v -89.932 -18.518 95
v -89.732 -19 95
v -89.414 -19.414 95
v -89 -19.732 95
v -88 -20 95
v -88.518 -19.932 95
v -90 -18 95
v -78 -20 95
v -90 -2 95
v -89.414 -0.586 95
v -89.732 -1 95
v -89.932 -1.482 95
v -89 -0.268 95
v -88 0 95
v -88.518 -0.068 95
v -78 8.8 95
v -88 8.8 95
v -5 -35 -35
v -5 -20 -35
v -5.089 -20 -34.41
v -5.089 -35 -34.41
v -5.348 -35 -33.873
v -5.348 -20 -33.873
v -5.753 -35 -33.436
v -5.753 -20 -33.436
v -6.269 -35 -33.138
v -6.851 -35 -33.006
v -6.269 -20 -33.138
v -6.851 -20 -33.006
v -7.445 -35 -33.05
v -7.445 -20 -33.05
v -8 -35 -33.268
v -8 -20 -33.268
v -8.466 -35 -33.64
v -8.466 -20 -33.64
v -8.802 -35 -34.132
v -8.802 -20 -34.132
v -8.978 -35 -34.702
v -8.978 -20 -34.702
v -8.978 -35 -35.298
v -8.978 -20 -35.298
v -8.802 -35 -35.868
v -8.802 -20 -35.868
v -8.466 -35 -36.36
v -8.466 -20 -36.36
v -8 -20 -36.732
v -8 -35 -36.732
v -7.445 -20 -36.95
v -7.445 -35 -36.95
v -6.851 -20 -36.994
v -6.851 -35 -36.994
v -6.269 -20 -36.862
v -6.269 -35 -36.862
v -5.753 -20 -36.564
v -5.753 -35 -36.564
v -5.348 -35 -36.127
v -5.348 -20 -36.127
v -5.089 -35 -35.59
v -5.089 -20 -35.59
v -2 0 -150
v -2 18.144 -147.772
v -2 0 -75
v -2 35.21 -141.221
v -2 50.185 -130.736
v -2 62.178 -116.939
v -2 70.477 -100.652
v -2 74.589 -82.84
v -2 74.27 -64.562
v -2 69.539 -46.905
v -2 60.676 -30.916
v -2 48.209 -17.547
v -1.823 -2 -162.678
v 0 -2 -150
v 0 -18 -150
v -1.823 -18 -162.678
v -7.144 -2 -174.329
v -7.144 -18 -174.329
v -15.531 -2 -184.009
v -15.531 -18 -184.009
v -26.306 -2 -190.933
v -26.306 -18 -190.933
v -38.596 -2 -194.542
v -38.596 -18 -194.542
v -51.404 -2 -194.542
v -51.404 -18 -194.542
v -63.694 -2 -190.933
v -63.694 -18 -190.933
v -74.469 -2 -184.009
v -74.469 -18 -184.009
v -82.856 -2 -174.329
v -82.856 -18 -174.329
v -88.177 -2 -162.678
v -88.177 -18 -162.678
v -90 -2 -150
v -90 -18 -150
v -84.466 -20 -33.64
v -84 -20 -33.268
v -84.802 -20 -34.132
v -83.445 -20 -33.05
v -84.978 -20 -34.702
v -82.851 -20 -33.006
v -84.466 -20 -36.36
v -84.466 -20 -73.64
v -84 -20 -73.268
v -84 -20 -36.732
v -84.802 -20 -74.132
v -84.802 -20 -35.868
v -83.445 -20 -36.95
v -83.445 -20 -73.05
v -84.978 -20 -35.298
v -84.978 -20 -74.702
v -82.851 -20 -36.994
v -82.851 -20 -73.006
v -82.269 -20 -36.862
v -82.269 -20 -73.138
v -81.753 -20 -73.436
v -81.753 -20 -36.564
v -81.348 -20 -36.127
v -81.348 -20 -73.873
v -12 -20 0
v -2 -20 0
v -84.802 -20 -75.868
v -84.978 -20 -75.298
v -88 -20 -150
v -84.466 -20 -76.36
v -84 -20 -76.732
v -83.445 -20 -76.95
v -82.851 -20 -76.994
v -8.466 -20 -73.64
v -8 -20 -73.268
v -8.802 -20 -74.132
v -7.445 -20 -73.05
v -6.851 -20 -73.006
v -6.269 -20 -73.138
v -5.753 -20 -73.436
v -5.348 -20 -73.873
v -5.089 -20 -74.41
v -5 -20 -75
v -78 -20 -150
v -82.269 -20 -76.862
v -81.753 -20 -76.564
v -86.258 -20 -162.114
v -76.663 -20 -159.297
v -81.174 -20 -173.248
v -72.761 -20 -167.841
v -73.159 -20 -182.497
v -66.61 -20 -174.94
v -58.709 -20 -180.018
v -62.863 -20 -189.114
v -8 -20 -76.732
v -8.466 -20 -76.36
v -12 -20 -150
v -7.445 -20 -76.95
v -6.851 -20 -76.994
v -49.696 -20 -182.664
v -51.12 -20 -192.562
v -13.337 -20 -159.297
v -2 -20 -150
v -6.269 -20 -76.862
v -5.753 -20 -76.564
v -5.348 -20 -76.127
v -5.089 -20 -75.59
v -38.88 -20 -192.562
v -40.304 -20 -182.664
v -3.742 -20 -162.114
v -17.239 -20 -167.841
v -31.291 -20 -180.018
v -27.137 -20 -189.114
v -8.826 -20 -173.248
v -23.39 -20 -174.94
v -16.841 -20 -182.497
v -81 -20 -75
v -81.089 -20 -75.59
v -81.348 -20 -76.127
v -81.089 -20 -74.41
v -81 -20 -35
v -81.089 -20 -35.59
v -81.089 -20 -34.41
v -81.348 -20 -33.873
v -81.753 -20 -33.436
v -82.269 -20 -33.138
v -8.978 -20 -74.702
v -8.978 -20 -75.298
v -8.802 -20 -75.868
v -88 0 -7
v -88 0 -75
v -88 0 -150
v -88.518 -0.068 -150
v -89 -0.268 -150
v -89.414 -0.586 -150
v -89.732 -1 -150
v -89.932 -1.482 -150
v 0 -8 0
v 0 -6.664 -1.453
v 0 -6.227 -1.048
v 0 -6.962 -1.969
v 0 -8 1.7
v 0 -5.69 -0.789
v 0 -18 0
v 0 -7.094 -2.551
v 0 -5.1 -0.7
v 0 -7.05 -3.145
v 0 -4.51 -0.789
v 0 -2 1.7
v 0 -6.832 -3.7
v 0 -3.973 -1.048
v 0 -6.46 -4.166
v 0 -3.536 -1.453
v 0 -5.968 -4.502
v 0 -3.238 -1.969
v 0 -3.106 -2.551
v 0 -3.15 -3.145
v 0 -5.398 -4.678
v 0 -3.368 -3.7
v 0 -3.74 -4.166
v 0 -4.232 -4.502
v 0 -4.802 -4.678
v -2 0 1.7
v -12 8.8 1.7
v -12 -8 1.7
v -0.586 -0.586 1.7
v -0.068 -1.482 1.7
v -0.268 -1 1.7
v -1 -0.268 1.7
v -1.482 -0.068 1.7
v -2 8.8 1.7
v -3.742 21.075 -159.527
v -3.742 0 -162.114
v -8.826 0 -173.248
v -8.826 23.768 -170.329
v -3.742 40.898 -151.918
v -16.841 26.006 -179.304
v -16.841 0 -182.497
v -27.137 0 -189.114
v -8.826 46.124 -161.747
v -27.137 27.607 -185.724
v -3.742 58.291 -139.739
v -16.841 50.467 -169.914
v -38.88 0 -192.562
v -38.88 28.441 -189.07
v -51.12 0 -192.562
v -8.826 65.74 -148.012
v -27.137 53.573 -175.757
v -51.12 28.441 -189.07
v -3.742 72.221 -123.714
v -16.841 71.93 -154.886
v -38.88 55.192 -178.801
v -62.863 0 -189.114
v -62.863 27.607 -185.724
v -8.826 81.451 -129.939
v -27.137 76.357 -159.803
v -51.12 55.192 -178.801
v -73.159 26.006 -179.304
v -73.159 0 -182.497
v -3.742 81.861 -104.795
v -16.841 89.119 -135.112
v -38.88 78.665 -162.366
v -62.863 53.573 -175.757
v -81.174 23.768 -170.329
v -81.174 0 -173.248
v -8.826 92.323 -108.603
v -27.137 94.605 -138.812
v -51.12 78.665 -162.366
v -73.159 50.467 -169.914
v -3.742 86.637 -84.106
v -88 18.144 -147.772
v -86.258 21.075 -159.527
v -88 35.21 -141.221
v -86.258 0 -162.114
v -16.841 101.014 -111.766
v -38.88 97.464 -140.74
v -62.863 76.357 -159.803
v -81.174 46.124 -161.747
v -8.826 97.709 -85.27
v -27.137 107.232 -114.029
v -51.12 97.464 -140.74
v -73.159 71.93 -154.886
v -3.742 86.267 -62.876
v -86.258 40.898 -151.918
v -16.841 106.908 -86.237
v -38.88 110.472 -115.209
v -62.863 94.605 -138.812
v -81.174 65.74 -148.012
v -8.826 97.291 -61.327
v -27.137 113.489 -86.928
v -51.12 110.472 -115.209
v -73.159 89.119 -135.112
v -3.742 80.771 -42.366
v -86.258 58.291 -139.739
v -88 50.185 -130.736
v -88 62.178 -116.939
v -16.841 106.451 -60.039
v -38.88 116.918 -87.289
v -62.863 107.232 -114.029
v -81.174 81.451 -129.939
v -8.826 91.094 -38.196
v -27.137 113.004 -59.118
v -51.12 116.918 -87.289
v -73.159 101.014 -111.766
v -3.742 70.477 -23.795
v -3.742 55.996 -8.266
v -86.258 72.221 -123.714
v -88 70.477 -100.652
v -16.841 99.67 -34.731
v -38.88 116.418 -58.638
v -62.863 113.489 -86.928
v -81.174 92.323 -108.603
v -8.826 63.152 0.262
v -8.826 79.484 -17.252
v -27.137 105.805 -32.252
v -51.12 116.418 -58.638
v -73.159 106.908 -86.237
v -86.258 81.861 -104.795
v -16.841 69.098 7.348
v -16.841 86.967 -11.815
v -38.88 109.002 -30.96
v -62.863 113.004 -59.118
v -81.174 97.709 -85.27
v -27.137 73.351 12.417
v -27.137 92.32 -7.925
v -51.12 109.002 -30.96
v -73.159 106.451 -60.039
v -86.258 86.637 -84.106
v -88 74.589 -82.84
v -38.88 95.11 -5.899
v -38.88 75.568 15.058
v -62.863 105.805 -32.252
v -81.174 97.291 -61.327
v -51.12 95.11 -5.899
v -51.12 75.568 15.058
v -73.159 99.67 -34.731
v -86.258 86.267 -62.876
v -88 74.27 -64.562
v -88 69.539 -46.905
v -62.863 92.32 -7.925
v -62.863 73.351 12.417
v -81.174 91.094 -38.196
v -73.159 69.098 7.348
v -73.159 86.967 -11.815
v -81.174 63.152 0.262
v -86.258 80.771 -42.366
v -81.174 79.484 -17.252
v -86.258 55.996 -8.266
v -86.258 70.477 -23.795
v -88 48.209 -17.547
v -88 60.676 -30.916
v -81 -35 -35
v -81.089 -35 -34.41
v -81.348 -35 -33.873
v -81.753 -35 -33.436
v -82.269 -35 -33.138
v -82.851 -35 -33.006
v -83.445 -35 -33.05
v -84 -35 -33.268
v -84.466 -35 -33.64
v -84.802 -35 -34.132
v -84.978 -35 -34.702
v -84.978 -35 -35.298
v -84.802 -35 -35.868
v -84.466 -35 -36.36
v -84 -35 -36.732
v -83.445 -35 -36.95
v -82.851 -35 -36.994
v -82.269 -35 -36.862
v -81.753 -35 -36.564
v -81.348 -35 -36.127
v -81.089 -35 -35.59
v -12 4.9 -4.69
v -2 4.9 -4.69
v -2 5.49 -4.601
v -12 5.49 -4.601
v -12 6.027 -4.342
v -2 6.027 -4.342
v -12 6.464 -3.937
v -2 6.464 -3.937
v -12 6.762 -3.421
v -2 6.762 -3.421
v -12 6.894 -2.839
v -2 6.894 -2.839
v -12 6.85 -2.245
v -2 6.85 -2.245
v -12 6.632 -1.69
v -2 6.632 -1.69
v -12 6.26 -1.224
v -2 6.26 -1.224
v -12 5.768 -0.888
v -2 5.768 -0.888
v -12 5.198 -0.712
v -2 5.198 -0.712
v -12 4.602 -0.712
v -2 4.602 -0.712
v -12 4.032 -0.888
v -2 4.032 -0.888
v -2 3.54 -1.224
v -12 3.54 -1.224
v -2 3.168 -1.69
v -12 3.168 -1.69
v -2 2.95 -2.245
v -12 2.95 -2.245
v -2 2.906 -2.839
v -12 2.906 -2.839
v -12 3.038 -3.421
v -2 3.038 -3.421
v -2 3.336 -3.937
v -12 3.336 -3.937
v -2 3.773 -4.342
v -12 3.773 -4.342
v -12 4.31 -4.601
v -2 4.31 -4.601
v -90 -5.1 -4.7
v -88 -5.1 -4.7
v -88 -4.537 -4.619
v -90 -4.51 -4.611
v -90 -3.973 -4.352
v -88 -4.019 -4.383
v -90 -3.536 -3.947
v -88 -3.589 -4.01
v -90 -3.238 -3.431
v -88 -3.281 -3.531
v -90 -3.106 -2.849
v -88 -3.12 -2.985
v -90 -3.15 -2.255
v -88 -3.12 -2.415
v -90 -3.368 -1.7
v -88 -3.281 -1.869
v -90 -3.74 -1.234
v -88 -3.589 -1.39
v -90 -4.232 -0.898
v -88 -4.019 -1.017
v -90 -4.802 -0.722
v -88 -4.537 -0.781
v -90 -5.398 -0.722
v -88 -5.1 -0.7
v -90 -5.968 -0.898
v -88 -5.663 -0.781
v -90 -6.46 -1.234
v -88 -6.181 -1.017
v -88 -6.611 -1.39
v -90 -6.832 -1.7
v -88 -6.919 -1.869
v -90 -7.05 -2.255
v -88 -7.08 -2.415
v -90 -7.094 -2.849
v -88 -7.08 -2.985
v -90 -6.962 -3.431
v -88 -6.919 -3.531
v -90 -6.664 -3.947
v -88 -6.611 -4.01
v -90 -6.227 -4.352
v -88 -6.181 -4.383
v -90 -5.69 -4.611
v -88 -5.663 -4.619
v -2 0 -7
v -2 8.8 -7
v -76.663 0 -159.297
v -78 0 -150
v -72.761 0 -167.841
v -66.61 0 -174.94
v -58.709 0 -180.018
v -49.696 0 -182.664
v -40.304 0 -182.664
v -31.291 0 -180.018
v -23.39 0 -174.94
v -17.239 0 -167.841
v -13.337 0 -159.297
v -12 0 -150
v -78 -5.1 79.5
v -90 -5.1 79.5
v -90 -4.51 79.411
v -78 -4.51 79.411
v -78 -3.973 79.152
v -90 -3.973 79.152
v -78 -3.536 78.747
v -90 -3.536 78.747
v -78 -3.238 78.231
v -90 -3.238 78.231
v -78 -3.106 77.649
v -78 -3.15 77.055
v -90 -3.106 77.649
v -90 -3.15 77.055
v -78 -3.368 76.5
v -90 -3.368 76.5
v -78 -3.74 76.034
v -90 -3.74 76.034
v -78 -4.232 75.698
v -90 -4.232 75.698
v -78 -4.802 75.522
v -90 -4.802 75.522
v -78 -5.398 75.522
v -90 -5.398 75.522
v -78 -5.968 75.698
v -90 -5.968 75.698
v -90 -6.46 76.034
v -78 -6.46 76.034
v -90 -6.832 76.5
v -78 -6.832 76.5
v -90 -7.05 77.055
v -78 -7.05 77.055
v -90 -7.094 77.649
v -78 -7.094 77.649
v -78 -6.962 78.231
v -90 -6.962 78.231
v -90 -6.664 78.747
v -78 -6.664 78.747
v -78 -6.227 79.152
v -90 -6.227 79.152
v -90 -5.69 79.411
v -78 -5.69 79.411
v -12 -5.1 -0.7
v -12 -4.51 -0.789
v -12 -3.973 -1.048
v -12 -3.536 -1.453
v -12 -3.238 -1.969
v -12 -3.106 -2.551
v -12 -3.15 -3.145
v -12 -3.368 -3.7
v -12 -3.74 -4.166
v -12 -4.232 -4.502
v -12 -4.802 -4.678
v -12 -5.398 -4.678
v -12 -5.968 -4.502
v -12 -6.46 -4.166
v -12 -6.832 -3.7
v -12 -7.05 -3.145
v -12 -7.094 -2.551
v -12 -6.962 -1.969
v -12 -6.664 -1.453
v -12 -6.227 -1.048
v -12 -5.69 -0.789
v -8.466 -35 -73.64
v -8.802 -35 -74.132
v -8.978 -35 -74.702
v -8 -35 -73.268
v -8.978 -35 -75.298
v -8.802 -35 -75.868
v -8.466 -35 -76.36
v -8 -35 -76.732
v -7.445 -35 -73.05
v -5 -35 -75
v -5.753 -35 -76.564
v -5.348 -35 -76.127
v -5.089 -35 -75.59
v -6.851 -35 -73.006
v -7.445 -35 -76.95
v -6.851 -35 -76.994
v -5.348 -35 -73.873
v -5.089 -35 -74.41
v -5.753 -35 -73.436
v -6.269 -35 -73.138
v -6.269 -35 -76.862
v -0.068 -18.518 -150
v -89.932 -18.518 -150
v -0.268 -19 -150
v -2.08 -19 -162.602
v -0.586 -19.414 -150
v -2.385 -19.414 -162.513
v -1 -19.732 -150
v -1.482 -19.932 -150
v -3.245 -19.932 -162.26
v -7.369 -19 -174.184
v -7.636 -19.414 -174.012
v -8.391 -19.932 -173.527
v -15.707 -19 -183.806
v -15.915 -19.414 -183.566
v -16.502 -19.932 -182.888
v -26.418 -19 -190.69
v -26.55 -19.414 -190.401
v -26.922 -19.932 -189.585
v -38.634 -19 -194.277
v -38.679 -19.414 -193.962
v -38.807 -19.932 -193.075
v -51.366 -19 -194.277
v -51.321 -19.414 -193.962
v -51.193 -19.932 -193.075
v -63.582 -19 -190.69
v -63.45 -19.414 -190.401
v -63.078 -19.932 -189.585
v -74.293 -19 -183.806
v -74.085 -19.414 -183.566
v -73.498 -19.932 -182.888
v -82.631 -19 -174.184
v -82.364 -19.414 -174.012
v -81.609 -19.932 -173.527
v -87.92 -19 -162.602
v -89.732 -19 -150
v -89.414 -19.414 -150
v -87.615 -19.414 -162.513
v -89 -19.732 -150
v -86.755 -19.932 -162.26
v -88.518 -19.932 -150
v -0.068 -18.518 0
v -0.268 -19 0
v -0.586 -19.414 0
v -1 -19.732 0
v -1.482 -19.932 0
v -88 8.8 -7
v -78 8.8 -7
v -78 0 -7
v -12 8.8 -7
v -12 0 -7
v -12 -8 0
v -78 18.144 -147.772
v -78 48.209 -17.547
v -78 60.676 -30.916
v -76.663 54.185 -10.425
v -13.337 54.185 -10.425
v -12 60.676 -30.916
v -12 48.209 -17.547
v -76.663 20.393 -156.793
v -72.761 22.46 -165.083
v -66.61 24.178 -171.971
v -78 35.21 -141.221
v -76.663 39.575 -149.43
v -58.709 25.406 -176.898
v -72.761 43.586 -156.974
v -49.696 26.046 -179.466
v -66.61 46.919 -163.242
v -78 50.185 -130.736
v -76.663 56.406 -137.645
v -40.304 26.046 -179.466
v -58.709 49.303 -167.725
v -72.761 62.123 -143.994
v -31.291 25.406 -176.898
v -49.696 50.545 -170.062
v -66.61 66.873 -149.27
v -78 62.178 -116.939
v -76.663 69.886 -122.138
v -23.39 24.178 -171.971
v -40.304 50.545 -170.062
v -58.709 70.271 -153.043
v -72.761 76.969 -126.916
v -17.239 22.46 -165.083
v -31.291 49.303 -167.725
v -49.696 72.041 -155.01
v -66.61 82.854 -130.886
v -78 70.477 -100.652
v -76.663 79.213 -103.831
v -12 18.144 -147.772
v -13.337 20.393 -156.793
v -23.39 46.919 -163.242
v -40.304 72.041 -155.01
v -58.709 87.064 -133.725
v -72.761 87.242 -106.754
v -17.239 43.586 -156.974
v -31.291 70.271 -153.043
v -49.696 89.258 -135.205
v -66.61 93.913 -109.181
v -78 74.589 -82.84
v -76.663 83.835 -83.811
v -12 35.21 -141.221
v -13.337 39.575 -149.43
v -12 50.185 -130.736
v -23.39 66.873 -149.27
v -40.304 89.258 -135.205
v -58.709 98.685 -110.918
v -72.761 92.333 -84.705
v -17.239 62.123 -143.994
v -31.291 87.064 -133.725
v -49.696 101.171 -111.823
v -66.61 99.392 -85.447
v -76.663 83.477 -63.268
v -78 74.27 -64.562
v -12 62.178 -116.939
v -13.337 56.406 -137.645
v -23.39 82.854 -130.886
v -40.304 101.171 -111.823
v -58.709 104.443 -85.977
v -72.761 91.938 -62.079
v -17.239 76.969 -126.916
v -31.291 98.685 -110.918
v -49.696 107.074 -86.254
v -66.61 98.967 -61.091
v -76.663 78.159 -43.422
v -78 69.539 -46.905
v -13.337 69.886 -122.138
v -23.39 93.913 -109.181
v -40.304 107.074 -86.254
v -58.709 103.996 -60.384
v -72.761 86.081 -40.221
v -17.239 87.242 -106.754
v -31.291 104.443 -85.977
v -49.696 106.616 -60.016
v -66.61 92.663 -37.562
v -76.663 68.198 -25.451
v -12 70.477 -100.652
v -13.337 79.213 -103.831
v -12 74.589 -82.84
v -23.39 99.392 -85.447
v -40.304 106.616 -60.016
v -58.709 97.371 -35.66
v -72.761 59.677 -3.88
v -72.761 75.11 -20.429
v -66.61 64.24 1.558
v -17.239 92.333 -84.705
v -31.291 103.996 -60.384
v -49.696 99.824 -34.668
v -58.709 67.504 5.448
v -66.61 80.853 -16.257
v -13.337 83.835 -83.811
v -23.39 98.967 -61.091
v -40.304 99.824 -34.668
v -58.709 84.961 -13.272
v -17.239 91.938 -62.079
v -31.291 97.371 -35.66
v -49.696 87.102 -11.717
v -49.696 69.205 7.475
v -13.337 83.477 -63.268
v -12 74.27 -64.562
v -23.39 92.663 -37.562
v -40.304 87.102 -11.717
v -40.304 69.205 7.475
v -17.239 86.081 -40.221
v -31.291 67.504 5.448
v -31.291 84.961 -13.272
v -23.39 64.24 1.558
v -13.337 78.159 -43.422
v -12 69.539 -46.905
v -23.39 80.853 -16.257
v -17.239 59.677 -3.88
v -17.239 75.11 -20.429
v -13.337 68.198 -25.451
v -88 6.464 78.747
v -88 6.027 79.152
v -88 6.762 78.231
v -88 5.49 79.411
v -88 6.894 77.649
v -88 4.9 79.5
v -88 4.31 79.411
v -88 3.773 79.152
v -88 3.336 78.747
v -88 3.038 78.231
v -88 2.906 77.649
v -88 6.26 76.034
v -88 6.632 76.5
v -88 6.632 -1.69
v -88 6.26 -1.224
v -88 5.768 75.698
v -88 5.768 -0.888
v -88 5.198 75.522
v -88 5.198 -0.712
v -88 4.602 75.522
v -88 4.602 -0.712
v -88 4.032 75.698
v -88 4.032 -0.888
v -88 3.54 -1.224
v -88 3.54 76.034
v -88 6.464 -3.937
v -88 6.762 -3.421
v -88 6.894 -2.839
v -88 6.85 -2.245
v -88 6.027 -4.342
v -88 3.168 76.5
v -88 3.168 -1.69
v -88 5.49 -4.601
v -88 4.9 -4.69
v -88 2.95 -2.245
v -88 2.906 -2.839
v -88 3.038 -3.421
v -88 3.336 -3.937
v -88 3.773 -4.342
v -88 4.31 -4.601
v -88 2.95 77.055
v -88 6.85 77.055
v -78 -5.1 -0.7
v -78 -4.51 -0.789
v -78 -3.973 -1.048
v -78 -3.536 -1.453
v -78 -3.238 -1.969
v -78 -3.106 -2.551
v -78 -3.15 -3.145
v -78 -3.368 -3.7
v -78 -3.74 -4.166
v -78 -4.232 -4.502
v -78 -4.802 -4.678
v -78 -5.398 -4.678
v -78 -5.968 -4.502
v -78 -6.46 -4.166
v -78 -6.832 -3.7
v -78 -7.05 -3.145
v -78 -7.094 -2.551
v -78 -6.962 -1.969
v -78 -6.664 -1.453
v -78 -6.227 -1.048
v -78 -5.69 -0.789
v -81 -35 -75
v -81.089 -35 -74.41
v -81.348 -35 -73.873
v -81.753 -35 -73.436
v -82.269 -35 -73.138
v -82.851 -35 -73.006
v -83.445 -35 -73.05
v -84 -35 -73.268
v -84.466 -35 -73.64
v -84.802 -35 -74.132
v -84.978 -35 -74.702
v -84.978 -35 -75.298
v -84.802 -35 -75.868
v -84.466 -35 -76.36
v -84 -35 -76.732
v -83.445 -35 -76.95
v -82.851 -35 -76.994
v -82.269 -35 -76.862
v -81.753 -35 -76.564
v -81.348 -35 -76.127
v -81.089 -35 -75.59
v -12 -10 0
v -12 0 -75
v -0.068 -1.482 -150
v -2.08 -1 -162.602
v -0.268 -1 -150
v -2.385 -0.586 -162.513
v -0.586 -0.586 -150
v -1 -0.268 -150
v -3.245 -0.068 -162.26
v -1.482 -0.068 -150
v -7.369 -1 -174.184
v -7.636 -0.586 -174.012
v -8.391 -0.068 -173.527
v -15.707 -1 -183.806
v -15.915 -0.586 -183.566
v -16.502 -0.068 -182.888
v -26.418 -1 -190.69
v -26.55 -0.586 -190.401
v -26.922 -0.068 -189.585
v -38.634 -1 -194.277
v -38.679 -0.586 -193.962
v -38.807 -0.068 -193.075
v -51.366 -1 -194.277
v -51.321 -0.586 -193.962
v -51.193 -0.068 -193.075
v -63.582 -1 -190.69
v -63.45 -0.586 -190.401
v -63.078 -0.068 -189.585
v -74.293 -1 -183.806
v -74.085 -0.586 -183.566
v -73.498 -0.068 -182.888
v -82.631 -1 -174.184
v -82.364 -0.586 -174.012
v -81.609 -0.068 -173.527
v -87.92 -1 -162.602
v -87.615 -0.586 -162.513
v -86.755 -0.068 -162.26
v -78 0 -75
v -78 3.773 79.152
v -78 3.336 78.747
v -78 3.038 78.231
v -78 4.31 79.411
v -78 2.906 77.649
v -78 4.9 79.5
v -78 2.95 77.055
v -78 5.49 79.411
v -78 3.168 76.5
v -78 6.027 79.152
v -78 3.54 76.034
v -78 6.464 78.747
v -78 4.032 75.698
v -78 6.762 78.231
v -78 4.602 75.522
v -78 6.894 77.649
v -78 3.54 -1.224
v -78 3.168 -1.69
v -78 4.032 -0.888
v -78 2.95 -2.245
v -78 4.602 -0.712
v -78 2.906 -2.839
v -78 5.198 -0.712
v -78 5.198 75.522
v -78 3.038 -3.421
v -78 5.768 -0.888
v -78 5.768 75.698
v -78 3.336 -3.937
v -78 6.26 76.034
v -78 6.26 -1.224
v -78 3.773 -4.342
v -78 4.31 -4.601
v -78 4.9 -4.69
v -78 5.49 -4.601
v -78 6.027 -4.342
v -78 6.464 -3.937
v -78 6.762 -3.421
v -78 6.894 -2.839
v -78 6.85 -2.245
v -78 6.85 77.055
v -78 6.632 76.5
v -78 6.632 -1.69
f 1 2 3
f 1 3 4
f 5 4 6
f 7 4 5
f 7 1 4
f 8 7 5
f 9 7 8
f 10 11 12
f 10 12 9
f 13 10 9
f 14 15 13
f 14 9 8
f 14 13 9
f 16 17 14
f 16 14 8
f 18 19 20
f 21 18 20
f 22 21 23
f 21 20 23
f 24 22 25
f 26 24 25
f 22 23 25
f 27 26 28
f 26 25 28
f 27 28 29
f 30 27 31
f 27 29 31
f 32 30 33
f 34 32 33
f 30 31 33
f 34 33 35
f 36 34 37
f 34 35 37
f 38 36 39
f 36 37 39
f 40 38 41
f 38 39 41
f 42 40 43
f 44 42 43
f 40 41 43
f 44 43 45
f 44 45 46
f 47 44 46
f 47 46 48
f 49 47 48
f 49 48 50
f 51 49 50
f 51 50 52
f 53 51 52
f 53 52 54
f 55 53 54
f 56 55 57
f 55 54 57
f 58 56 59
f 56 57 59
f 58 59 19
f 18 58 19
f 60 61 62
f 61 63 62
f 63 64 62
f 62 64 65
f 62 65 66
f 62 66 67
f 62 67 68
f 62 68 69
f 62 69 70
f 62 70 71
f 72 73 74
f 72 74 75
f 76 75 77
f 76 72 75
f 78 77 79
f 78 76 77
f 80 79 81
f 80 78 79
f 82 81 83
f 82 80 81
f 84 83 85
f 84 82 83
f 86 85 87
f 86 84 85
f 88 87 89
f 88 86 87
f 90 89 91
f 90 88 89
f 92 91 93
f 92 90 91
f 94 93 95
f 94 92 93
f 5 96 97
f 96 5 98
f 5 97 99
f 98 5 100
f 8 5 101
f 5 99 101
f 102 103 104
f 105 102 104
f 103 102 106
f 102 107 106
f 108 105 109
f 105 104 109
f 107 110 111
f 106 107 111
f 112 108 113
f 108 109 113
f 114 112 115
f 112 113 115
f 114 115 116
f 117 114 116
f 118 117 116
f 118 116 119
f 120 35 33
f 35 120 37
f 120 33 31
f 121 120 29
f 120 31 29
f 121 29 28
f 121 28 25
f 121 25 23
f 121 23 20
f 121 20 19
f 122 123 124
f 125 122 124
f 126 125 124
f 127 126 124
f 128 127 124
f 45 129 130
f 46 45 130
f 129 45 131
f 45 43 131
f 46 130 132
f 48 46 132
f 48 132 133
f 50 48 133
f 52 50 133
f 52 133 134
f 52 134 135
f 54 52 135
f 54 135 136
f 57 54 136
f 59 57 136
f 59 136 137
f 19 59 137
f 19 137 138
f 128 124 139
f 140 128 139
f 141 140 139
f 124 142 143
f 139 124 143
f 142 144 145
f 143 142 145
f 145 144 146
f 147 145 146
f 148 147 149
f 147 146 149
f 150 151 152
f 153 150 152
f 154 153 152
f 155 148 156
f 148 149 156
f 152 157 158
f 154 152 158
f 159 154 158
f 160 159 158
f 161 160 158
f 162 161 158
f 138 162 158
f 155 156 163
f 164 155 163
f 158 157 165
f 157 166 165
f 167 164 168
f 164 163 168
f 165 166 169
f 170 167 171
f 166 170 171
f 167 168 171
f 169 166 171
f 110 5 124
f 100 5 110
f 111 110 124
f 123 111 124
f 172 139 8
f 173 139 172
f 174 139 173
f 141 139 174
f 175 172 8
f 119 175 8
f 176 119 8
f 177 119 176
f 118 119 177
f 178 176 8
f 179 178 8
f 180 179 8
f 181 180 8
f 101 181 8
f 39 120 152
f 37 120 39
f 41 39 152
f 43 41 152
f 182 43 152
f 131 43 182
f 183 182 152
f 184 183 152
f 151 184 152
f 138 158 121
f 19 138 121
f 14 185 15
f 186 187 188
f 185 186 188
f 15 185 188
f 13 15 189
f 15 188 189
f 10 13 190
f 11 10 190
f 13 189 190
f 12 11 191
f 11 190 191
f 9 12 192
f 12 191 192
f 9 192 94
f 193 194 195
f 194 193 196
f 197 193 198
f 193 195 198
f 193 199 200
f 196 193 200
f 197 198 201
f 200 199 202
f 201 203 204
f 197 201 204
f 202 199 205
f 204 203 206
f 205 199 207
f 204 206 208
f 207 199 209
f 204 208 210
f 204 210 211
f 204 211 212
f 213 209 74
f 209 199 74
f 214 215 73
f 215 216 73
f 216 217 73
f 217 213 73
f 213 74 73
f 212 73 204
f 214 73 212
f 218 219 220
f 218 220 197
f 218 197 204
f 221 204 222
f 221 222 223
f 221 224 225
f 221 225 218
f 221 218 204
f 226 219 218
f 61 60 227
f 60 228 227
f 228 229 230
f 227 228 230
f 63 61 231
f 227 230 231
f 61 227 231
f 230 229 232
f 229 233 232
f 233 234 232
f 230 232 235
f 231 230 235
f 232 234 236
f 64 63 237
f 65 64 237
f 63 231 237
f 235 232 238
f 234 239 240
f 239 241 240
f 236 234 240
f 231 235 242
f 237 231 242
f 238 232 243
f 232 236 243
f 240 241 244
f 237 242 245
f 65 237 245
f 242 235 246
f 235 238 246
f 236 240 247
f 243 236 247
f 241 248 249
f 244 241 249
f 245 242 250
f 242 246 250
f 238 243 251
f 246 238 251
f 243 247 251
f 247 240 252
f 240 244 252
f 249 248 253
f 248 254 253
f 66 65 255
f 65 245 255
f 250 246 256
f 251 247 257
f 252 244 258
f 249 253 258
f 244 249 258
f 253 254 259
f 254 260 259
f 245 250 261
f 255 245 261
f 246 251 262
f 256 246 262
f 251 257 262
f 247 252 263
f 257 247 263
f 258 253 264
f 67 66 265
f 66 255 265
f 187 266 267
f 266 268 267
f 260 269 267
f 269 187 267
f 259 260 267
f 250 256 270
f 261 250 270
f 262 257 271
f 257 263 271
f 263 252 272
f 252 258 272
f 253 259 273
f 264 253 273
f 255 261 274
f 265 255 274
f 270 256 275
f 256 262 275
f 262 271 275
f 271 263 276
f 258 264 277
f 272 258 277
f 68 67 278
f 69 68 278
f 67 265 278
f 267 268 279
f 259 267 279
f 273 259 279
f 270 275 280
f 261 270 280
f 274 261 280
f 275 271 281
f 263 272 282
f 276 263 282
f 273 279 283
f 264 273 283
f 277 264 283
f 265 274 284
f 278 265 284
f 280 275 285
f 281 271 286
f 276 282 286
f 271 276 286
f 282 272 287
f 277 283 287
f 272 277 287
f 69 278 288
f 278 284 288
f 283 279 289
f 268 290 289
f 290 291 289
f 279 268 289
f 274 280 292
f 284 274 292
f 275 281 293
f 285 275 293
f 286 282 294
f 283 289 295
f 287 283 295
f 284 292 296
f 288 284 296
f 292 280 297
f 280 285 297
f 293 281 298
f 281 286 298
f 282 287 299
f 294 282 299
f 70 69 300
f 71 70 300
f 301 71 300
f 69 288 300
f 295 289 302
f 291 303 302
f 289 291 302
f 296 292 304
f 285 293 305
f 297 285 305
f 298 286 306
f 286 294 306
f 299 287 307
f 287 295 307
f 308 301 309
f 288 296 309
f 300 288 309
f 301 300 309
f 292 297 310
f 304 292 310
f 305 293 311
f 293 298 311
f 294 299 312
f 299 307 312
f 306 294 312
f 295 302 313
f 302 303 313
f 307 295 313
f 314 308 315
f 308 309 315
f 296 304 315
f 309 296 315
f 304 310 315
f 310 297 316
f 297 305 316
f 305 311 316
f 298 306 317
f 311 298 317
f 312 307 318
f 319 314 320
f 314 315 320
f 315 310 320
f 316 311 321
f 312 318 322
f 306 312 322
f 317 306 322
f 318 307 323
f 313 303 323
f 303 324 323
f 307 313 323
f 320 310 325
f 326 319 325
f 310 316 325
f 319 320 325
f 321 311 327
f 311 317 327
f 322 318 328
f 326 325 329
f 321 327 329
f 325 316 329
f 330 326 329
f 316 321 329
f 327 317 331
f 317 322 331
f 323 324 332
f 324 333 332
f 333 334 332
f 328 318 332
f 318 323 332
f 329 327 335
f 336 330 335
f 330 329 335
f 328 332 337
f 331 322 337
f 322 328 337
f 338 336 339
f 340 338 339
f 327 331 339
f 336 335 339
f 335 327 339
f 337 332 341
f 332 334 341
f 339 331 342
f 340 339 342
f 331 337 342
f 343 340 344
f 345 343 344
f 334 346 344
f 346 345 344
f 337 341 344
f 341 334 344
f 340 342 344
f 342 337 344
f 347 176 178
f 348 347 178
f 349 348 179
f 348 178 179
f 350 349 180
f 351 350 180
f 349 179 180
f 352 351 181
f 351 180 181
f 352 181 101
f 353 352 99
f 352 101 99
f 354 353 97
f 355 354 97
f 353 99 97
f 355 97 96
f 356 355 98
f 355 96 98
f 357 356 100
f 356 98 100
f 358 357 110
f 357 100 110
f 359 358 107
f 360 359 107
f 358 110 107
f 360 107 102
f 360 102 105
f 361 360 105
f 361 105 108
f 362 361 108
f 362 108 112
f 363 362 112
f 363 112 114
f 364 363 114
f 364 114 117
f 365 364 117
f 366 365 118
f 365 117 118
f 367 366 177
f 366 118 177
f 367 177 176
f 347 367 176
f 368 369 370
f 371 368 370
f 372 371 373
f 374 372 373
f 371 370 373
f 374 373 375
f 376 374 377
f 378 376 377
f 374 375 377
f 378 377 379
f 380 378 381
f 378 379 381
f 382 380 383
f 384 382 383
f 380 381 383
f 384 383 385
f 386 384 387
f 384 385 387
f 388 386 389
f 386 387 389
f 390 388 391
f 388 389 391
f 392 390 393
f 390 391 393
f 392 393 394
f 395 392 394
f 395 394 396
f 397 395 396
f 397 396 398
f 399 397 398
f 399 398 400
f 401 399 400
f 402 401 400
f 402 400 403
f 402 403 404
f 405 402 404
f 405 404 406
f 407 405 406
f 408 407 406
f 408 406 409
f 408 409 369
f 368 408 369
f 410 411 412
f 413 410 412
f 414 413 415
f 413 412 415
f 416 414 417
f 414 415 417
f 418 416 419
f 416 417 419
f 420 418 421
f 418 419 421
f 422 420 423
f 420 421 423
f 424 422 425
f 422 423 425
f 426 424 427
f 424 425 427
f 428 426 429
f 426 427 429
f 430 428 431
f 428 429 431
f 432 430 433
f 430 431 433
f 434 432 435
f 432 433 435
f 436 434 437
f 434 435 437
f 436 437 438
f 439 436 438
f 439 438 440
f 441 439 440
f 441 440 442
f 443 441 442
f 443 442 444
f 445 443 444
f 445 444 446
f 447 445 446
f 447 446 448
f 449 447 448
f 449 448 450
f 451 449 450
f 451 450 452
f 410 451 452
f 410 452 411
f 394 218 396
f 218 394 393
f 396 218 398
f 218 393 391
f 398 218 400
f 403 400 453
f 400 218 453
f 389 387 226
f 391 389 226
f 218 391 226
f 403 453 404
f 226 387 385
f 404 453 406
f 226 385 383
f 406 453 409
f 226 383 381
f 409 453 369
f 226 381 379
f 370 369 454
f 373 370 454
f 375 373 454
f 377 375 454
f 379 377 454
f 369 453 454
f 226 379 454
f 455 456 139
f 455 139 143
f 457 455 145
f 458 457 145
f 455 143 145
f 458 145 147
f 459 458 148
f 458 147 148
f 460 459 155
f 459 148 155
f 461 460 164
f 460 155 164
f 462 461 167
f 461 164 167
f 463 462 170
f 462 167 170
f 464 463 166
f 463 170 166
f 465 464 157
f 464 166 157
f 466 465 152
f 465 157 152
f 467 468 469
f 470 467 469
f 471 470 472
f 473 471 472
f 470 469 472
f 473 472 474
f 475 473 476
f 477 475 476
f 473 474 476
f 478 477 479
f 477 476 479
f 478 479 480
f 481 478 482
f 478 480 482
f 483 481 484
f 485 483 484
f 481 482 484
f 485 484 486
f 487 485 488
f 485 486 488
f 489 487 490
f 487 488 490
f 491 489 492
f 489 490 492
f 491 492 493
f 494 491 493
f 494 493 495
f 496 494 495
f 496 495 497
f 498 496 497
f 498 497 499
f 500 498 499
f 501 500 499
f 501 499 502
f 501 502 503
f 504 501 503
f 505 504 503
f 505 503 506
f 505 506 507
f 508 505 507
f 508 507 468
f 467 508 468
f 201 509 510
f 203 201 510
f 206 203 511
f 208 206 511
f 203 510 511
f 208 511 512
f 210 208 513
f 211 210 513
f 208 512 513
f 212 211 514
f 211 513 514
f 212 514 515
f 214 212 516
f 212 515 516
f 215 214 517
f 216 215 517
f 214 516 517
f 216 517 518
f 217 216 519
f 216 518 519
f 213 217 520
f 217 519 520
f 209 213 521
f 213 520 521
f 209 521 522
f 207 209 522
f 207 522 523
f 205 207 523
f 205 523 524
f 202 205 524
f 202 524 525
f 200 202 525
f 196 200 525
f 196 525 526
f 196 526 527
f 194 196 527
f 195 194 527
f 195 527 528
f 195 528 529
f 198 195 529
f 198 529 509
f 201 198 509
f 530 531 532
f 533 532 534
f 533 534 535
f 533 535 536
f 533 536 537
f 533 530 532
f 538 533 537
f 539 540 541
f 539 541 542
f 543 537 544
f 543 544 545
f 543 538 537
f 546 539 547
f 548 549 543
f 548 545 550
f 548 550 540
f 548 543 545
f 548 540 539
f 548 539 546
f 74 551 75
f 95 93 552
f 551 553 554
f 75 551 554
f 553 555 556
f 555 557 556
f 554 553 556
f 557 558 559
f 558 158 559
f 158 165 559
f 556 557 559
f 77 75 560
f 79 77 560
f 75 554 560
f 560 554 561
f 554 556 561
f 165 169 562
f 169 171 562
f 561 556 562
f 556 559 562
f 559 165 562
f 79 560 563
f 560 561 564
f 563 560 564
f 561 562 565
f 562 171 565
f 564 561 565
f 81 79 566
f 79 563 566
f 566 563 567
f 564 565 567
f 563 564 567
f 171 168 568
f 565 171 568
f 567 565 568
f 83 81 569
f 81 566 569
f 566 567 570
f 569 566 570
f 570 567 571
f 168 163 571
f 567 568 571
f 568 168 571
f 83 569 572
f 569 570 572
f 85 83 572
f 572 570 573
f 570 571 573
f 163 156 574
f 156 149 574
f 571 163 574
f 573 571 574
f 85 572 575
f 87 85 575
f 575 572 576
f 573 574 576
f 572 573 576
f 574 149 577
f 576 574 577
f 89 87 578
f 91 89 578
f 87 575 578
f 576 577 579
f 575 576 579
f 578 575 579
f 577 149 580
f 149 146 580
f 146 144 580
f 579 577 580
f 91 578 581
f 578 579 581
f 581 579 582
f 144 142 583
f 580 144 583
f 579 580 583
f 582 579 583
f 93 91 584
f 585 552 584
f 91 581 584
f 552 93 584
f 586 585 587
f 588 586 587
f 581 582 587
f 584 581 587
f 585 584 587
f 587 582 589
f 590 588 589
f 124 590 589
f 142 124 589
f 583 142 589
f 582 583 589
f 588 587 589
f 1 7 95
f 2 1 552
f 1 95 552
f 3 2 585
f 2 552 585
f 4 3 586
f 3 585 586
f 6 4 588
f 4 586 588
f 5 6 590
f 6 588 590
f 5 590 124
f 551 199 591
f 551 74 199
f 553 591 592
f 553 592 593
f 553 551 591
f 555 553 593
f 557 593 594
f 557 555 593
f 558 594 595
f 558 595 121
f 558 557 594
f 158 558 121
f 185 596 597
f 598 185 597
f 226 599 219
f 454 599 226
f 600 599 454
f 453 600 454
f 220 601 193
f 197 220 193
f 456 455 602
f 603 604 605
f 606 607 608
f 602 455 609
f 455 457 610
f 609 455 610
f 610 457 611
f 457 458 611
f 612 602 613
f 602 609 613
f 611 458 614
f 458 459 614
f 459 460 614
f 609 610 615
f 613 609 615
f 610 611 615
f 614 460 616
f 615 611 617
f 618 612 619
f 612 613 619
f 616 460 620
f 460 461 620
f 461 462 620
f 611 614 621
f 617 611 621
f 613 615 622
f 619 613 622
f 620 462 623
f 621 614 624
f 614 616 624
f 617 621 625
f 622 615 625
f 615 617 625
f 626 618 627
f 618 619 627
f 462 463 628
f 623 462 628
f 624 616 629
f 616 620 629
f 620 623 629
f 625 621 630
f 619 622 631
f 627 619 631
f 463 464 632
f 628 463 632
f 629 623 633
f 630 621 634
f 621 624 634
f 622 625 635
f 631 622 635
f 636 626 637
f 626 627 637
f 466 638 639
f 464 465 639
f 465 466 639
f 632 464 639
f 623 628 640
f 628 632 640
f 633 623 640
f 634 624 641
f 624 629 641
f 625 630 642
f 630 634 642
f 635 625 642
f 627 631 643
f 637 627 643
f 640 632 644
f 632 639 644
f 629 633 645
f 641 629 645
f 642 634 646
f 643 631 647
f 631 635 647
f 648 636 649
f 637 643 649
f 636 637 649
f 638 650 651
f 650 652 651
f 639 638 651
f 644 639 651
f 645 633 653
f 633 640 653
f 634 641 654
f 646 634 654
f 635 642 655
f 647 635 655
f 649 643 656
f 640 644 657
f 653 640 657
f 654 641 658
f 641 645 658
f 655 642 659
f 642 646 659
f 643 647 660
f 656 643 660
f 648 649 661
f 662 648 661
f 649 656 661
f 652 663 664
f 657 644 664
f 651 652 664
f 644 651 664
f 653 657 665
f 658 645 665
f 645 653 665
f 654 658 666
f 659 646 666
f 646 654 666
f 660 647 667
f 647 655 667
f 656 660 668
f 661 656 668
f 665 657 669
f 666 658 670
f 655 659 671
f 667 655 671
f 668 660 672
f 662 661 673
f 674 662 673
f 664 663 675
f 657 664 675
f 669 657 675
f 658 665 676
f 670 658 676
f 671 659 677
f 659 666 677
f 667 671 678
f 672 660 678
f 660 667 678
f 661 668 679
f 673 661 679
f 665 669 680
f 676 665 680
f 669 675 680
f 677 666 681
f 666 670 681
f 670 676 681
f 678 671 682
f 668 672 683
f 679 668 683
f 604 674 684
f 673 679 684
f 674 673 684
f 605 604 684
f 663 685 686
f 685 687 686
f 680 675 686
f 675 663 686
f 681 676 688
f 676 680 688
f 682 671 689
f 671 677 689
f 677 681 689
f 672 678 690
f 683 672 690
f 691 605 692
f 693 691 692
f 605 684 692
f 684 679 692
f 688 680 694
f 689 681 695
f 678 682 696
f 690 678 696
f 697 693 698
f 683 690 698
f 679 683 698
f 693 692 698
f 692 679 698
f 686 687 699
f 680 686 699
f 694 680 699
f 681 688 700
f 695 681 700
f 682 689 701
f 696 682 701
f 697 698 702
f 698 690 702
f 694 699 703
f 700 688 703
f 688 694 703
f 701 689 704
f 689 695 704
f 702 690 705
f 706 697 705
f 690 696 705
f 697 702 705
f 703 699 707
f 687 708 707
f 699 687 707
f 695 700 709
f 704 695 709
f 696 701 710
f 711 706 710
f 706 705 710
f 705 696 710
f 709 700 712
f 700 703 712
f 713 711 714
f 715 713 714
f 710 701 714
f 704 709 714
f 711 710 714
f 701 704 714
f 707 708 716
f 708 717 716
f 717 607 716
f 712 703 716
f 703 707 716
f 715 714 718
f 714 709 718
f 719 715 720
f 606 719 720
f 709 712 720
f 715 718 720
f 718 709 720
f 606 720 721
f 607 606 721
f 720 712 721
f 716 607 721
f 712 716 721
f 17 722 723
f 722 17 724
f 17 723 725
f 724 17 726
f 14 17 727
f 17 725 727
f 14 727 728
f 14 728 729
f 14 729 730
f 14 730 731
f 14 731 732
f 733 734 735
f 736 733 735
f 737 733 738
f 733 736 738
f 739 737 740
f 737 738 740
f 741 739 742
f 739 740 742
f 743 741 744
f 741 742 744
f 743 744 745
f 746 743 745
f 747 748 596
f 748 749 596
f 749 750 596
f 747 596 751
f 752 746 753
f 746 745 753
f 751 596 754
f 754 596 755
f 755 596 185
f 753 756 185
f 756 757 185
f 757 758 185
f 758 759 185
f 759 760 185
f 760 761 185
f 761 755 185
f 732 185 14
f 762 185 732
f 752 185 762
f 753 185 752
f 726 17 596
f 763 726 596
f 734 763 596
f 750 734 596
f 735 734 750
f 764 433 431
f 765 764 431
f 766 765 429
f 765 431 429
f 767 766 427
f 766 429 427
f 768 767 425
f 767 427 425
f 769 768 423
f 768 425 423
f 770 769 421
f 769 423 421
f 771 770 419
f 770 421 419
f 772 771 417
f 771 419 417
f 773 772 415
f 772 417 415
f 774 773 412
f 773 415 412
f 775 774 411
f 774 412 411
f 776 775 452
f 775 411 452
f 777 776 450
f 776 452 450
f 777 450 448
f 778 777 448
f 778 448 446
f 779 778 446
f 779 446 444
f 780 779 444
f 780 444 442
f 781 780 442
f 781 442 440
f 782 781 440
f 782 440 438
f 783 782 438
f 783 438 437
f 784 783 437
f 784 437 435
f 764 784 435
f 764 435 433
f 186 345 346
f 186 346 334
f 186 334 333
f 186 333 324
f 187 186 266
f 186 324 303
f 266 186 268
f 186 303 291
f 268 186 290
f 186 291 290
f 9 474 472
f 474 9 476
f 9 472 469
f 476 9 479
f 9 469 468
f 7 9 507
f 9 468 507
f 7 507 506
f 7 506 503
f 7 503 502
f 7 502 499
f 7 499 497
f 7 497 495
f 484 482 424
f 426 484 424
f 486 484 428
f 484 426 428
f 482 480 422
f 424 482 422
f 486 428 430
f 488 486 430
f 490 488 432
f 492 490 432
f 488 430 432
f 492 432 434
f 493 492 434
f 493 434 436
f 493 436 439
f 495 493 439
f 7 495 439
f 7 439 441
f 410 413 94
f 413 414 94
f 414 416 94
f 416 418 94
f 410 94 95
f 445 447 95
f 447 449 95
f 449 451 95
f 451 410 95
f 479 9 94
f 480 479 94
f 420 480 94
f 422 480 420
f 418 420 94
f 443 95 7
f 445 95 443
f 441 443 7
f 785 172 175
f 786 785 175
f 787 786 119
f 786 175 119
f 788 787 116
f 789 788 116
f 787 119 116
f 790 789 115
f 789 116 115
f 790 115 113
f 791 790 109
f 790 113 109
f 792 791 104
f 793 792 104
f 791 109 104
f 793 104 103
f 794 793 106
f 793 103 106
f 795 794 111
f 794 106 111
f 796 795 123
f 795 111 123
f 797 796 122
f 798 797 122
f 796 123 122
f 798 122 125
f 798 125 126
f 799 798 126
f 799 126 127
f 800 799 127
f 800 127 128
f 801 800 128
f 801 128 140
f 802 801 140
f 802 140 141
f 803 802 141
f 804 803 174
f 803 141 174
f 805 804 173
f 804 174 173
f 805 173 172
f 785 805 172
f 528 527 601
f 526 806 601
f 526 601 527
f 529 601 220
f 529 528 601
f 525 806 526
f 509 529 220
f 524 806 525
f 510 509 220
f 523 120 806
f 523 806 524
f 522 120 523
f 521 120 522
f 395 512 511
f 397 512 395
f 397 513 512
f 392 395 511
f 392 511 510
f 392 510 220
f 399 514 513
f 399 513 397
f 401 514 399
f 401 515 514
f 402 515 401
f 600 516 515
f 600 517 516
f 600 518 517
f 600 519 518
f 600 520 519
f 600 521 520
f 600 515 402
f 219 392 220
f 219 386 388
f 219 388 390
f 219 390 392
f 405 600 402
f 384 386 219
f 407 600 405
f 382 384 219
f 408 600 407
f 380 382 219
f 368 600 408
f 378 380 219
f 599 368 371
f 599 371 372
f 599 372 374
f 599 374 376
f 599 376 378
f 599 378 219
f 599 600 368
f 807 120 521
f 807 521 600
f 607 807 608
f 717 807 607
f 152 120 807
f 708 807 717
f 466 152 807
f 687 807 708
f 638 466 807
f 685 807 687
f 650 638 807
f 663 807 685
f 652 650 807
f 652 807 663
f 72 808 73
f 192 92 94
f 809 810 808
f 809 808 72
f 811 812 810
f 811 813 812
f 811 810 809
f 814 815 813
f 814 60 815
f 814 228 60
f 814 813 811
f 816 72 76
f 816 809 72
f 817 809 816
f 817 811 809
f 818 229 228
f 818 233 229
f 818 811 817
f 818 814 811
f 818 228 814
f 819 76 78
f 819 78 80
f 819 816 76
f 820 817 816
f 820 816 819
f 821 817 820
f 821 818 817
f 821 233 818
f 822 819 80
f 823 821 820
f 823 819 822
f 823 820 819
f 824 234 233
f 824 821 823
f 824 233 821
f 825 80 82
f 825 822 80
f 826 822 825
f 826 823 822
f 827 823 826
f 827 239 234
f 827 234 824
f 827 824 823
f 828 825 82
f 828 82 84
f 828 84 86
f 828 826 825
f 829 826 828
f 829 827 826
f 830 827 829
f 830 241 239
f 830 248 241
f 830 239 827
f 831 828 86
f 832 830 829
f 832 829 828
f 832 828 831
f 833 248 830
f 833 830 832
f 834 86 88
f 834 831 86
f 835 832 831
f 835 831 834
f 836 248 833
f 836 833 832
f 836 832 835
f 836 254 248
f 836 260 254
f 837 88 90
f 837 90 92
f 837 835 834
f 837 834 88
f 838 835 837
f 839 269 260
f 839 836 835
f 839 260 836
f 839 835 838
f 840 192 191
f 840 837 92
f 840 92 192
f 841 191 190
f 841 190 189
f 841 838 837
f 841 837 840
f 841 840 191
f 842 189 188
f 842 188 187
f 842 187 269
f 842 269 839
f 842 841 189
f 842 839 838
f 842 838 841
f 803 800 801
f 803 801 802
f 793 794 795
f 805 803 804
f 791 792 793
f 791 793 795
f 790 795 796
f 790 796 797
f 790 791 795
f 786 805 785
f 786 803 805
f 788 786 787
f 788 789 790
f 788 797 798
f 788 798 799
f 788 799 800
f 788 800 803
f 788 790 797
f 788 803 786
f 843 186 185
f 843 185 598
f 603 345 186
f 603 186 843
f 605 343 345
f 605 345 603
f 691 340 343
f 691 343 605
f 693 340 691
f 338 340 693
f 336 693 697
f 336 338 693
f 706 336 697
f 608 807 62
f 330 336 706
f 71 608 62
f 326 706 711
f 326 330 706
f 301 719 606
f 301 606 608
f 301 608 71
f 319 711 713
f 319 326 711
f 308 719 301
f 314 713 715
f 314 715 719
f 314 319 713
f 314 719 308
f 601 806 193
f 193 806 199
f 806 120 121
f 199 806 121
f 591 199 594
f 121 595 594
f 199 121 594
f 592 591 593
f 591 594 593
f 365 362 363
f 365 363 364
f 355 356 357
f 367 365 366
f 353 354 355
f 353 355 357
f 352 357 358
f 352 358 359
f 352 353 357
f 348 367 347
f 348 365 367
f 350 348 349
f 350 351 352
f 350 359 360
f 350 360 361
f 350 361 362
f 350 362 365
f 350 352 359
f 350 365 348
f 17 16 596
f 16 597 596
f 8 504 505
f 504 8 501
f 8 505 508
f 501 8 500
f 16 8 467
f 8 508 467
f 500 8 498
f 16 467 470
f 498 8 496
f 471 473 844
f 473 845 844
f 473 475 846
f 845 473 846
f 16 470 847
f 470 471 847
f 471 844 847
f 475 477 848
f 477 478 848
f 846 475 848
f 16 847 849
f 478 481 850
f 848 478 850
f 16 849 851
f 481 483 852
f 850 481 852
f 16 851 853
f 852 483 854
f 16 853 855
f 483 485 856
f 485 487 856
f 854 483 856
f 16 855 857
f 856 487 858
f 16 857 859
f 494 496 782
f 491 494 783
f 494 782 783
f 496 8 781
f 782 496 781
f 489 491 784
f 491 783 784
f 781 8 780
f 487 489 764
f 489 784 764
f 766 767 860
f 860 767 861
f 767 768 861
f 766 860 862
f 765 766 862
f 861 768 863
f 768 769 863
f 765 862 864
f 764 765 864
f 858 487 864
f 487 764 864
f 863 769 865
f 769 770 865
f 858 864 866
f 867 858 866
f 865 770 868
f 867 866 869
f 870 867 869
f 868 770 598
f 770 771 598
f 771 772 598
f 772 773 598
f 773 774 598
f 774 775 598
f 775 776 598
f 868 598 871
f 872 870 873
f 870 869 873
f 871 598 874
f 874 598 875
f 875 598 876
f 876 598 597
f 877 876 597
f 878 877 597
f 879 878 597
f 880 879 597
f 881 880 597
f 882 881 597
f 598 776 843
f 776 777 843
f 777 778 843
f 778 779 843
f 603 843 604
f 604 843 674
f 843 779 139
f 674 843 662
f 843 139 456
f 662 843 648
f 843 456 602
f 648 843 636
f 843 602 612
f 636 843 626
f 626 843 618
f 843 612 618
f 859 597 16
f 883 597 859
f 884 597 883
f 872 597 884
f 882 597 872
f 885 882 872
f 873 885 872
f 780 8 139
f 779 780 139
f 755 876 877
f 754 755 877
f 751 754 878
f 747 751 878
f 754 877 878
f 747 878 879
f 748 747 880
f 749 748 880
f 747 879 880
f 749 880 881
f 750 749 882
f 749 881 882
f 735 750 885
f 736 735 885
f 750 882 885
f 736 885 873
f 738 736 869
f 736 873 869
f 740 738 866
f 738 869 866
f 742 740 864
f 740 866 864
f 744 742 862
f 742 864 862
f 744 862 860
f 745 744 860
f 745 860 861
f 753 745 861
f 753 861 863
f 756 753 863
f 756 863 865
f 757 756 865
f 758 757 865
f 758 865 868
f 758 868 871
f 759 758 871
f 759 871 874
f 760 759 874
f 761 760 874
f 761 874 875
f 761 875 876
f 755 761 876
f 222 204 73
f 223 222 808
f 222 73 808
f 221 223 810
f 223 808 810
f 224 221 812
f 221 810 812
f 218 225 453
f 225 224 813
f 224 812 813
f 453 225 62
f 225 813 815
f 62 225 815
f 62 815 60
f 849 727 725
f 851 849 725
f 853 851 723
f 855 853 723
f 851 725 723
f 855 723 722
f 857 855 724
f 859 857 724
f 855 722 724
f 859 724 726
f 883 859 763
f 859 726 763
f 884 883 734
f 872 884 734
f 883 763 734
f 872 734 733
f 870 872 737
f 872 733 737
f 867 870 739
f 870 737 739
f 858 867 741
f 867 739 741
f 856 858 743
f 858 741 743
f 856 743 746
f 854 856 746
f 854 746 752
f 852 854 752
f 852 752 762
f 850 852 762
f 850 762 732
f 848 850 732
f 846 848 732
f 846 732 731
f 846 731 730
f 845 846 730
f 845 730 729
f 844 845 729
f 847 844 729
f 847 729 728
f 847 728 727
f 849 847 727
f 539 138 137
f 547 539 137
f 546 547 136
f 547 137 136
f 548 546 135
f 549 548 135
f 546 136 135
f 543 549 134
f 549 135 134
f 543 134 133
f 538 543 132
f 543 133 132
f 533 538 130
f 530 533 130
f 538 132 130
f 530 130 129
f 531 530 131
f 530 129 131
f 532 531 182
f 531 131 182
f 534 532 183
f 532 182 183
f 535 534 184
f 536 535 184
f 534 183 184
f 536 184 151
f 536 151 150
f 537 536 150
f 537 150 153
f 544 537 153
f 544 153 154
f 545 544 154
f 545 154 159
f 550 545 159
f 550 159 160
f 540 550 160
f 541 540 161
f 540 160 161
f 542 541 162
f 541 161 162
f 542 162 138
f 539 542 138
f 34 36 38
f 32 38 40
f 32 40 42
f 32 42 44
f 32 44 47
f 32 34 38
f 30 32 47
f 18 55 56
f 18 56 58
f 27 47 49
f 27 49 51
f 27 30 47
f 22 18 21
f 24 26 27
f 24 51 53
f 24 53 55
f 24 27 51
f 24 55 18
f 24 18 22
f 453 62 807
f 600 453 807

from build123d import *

# Parameters (mm, degrees)
BOSS_EXTRUDE1_DEPTH  = 20
FILLET1_R            = 2
CUT_EXTRUDE3_DEPTH   = 15
REVOLVE1_ANGLE       = 140
CUT_EXTRUDE5_DEPTH   = 20
SKETCH12_R           = 2
BOSS_EXTRUDE3_DEPTH  = 15
SKETCH14_W           = 90
SKETCH14_H           = 51.446942877
CUT_EXTRUDE6_DEPTH   = 10
SKETCH15_R           = 2
BOSS_EXTRUDE4_DEPTH  = 25
SKETCH19_W           = 2
SKETCH19_H           = 5
CUT_EXTRUDE7_DEPTH   = 150
SKETCH21_W           = 90
SKETCH21_H           = 51.374670228
CUT_EXTRUDE9_DEPTH   = 40
CUT_EXTRUDE10_DEPTH  = 20
BOSS_EXTRUDE6_DEPTH  = 1.7
SKETCH28_W           = 10
SKETCH28_H           = 8.8
BOSS_EXTRUDE7_DEPTH  = 7
SKETCH29_W           = 10
SKETCH29_H           = 8.8
BOSS_EXTRUDE8_DEPTH  = 1.7
SKETCH30_R           = 2
CUT_EXTRUDE11_DEPTH  = 89
SKETCH31_W           = 10
SKETCH31_H           = 8.8
BOSS_EXTRUDE9_DEPTH  = 7
SKETCH32_R           = 2
CUT_EXTRUDE12_DEPTH  = 20
SKETCH34_R           = 2
CUT_EXTRUDE13_DEPTH  = 89
SKETCH35_R           = 2
CUT_EXTRUDE14_DEPTH  = 20
BOSS_EXTRUDE10_DEPTH = 95
SKETCH39_R           = 2
CUT_EXTRUDE15_DEPTH  = 80


with BuildPart() as part:
    # Sketch1 → Boss-Extrude1 (new body)
    with BuildSketch(Plane(origin=(0, 0, 0), x_dir=(1, 0, 0), z_dir=(0, 1, 0))):
        with BuildLine():
            Line((0, 0), (0, 150))
            ThreePointArc((0, 150), (-45, 195), (-90, 150))
            Line((-90, 150), (-90, 0))
            ThreePointArc((-90, 0), (-45, -45), (0, 0))
        make_face()
    extrude(amount=-BOSS_EXTRUDE1_DEPTH)

    # Fillet1
    fillet1_edges = [part.edges().sort_by_distance(p)[0] for p in [
        (-45, -20, -195),
        (-90, -20, -75),
        (-45, -20, 45),
        (-90, 0, -75),
        (-45, 0, -195),
        (0, 0, -75),
        (-45, 0, 45),
        (0, -20, -75),
    ]]
    fillet(fillet1_edges, radius=FILLET1_R)

    # Sketch5 → Cut-Extrude3 (cut)
    with BuildSketch(Plane(origin=(0, 0, 0), x_dir=(1, 0, 0), z_dir=(0, 1, 0))):
        with BuildLine():
            Line((-78, 0), (-78, 150))
            ThreePointArc((-78, 150), (-45, 183), (-12, 150))
            Line((-12, 150), (-12, 0))
            ThreePointArc((-12, 0), (-45, -33), (-78, 0))
        make_face()
    extrude(amount=-CUT_EXTRUDE3_DEPTH, mode=Mode.SUBTRACT)

    # Sketch8 → Revolve1 (revolve)
    with BuildSketch(Plane(origin=(0, 0, 0), x_dir=(1, 0, 0), z_dir=(0, 1, 0))):
        with BuildLine():
            Line((-2, 75), (-2, 150))
            ThreePointArc((-2, 150), (-45, 193), (-88, 150))
            Line((-88, 150), (-88, 75))
            Line((-88, 75), (-78, 75))
            Line((-78, 75), (-78, 150))
            ThreePointArc((-78, 150), (-45, 183), (-12, 150))
            Line((-12, 150), (-12, 75))
            Line((-12, 75), (-2, 75))
        make_face()
    revolve(axis=Axis((-12, 0, -75), (1, 0, 0)), revolution_arc=REVOLVE1_ANGLE)

    # Sketch11 → Cut-Extrude5 (cut)
    with BuildSketch(Plane.XZ.offset(20)):
        with BuildLine():
            Line((-76, -150), (-76, 0))
            ThreePointArc((-76, 0), (-45, 31), (-14, 0))
            Line((-14, 0), (-14, -150))
            ThreePointArc((-14, -150), (-45, -181), (-76, -150))
        make_face()
    extrude(amount=-CUT_EXTRUDE5_DEPTH, mode=Mode.SUBTRACT)

    # Sketch12 → Boss-Extrude3 (add)
    with BuildSketch(Plane.XZ.offset(20)):
        with Locations((-83, -75)):
            Circle(SKETCH12_R)
        with Locations((-83, -35)):
            Circle(SKETCH12_R)
        with Locations((-83, 5)):
            Circle(SKETCH12_R)
        with Locations((-7, 5)):
            Circle(SKETCH12_R)
        with Locations((-7, -35)):
            Circle(SKETCH12_R)
        with Locations((-7, -75)):
            Circle(SKETCH12_R)
    extrude(amount=BOSS_EXTRUDE3_DEPTH)

    # Sketch14 → Cut-Extrude6 (cut)
    with BuildSketch(Plane.XZ.offset(20)):
        with Locations((-45, 25.723471439)):
            Rectangle(SKETCH14_W, SKETCH14_H)
    extrude(amount=-CUT_EXTRUDE6_DEPTH, mode=Mode.SUBTRACT)

    # Sketch15 → Boss-Extrude4 (add)
    with BuildSketch(Plane.XZ.offset(35)):
        with Locations((-7, 5)):
            Circle(SKETCH15_R)
        with Locations((-83, 5)):
            Circle(SKETCH15_R)
    extrude(amount=-BOSS_EXTRUDE4_DEPTH)

    # Sketch19 → Cut-Extrude7 (cut)
    with BuildSketch(Plane.XY):
        with Locations((-13, -17.5)):
            Rectangle(SKETCH19_W, SKETCH19_H)
        with Locations((-77, -17.5)):
            Rectangle(SKETCH19_W, SKETCH19_H)
    extrude(amount=-CUT_EXTRUDE7_DEPTH, mode=Mode.SUBTRACT)

    # Sketch21 → Cut-Extrude9 (cut)
    with BuildSketch(Plane(origin=(0, -35, 0), x_dir=(-1, 0, 0), z_dir=(0, -1, 0))):
        with Locations((45, -25.687335114)):
            Rectangle(SKETCH21_W, SKETCH21_H)
    extrude(amount=-CUT_EXTRUDE9_DEPTH, mode=Mode.SUBTRACT)

    # Sketch24 → Cut-Extrude10 (cut)
    with BuildSketch(Plane(origin=(0, -20, 0), x_dir=(-1, 0, 0), z_dir=(0, -1, 0))):
        with BuildLine():
            Line((12, 150), (14, 150))
            ThreePointArc((14, 150), (45, 181), (76, 150))
            Line((76, 150), (78, 150))
            ThreePointArc((78, 150), (45, 183), (12, 150))
        make_face()
    extrude(amount=-CUT_EXTRUDE10_DEPTH, mode=Mode.SUBTRACT)

    # Sketch26 → Boss-Extrude6 (add)
    with BuildSketch(Plane.XY):
        with BuildLine():
            Line((-2, 0), (-12, 0))
            Line((-12, 0), (-12, -8))
            Line((-12, -8), (-2, -8))
            Line((-2, -8), (0, -8))
            Line((0, -8), (0, -2))
            ThreePointArc((0, -2), (-0.585786438, -0.585786438), (-2, 0))
        make_face()
    extrude(amount=BOSS_EXTRUDE6_DEPTH)

    # Sketch28 → Boss-Extrude7 (add)
    with BuildSketch(Plane.XY):
        with Locations((-7, 4.4)):
            Rectangle(SKETCH28_W, SKETCH28_H)
    extrude(amount=-BOSS_EXTRUDE7_DEPTH)

    # Sketch29 → Boss-Extrude8 (add)
    with BuildSketch(Plane.XY):
        with Locations((-7, 4.4)):
            Rectangle(SKETCH29_W, SKETCH29_H)
    extrude(amount=BOSS_EXTRUDE8_DEPTH)

    # Sketch30 → Cut-Extrude11 (cut, through all)
    with BuildSketch(Plane(origin=(-2, 0, 0), x_dir=(0, 0, -1), z_dir=(1, 0, 0))):
        with Locations((2.69, 4.9)):
            Circle(SKETCH30_R)
    extrude(amount=-CUT_EXTRUDE11_DEPTH, mode=Mode.SUBTRACT)

    # Sketch31 → Boss-Extrude9 (add)
    with BuildSketch(Plane.XY):
        with Locations((-83, 4.4)):
            Rectangle(SKETCH31_W, SKETCH31_H)
    extrude(amount=-BOSS_EXTRUDE9_DEPTH)

    # Sketch32 → Cut-Extrude12 (cut)
    with BuildSketch(Plane(origin=(-78, 0, 0), x_dir=(0, 0, -1), z_dir=(1, 0, 0))):
        with Locations((2.69, 4.9)):
            Circle(SKETCH32_R)
    extrude(amount=-CUT_EXTRUDE12_DEPTH, mode=Mode.SUBTRACT)

    # Sketch34 → Cut-Extrude13 (cut, through all)
    with BuildSketch(Plane.ZY.offset(88)):
        with Locations((-2.7, -5.1)):
            Circle(SKETCH34_R)
    extrude(amount=-CUT_EXTRUDE13_DEPTH, mode=Mode.SUBTRACT)

    # Sketch35 → Cut-Extrude14 (cut)
    with BuildSketch(Plane(origin=(-88, 0, 0), x_dir=(0, 0, -1), z_dir=(1, 0, 0))):
        with Locations((2.7, -5.1)):
            Circle(SKETCH35_R)
    extrude(amount=-CUT_EXTRUDE14_DEPTH, mode=Mode.SUBTRACT)

    # Sketch36 → Boss-Extrude10 (add)
    with BuildSketch(Plane.XY):
        with BuildLine():
            Line((-88, -20), (-78, -20))
            Line((-78, -20), (-78, 8.8))
            Line((-78, 8.8), (-88, 8.8))
            Line((-88, 8.8), (-88, 0))
            ThreePointArc((-88, 0), (-89.414213562, -0.585786438), (-90, -2))
            Line((-90, -2), (-90, -18))
            ThreePointArc((-90, -18), (-89.414213562, -19.414213562), (-88, -20))
        make_face()
    extrude(amount=BOSS_EXTRUDE10_DEPTH)

    # Sketch39 → Cut-Extrude15 (cut)
    with BuildSketch(Plane.ZY.offset(90)):
        with Locations((77.5, -5.1)):
            Circle(SKETCH39_R)
        with Locations((77.5, 4.9)):
            Circle(SKETCH39_R)
    extrude(amount=-CUT_EXTRUDE15_DEPTH, mode=Mode.SUBTRACT)


solid = part.part
